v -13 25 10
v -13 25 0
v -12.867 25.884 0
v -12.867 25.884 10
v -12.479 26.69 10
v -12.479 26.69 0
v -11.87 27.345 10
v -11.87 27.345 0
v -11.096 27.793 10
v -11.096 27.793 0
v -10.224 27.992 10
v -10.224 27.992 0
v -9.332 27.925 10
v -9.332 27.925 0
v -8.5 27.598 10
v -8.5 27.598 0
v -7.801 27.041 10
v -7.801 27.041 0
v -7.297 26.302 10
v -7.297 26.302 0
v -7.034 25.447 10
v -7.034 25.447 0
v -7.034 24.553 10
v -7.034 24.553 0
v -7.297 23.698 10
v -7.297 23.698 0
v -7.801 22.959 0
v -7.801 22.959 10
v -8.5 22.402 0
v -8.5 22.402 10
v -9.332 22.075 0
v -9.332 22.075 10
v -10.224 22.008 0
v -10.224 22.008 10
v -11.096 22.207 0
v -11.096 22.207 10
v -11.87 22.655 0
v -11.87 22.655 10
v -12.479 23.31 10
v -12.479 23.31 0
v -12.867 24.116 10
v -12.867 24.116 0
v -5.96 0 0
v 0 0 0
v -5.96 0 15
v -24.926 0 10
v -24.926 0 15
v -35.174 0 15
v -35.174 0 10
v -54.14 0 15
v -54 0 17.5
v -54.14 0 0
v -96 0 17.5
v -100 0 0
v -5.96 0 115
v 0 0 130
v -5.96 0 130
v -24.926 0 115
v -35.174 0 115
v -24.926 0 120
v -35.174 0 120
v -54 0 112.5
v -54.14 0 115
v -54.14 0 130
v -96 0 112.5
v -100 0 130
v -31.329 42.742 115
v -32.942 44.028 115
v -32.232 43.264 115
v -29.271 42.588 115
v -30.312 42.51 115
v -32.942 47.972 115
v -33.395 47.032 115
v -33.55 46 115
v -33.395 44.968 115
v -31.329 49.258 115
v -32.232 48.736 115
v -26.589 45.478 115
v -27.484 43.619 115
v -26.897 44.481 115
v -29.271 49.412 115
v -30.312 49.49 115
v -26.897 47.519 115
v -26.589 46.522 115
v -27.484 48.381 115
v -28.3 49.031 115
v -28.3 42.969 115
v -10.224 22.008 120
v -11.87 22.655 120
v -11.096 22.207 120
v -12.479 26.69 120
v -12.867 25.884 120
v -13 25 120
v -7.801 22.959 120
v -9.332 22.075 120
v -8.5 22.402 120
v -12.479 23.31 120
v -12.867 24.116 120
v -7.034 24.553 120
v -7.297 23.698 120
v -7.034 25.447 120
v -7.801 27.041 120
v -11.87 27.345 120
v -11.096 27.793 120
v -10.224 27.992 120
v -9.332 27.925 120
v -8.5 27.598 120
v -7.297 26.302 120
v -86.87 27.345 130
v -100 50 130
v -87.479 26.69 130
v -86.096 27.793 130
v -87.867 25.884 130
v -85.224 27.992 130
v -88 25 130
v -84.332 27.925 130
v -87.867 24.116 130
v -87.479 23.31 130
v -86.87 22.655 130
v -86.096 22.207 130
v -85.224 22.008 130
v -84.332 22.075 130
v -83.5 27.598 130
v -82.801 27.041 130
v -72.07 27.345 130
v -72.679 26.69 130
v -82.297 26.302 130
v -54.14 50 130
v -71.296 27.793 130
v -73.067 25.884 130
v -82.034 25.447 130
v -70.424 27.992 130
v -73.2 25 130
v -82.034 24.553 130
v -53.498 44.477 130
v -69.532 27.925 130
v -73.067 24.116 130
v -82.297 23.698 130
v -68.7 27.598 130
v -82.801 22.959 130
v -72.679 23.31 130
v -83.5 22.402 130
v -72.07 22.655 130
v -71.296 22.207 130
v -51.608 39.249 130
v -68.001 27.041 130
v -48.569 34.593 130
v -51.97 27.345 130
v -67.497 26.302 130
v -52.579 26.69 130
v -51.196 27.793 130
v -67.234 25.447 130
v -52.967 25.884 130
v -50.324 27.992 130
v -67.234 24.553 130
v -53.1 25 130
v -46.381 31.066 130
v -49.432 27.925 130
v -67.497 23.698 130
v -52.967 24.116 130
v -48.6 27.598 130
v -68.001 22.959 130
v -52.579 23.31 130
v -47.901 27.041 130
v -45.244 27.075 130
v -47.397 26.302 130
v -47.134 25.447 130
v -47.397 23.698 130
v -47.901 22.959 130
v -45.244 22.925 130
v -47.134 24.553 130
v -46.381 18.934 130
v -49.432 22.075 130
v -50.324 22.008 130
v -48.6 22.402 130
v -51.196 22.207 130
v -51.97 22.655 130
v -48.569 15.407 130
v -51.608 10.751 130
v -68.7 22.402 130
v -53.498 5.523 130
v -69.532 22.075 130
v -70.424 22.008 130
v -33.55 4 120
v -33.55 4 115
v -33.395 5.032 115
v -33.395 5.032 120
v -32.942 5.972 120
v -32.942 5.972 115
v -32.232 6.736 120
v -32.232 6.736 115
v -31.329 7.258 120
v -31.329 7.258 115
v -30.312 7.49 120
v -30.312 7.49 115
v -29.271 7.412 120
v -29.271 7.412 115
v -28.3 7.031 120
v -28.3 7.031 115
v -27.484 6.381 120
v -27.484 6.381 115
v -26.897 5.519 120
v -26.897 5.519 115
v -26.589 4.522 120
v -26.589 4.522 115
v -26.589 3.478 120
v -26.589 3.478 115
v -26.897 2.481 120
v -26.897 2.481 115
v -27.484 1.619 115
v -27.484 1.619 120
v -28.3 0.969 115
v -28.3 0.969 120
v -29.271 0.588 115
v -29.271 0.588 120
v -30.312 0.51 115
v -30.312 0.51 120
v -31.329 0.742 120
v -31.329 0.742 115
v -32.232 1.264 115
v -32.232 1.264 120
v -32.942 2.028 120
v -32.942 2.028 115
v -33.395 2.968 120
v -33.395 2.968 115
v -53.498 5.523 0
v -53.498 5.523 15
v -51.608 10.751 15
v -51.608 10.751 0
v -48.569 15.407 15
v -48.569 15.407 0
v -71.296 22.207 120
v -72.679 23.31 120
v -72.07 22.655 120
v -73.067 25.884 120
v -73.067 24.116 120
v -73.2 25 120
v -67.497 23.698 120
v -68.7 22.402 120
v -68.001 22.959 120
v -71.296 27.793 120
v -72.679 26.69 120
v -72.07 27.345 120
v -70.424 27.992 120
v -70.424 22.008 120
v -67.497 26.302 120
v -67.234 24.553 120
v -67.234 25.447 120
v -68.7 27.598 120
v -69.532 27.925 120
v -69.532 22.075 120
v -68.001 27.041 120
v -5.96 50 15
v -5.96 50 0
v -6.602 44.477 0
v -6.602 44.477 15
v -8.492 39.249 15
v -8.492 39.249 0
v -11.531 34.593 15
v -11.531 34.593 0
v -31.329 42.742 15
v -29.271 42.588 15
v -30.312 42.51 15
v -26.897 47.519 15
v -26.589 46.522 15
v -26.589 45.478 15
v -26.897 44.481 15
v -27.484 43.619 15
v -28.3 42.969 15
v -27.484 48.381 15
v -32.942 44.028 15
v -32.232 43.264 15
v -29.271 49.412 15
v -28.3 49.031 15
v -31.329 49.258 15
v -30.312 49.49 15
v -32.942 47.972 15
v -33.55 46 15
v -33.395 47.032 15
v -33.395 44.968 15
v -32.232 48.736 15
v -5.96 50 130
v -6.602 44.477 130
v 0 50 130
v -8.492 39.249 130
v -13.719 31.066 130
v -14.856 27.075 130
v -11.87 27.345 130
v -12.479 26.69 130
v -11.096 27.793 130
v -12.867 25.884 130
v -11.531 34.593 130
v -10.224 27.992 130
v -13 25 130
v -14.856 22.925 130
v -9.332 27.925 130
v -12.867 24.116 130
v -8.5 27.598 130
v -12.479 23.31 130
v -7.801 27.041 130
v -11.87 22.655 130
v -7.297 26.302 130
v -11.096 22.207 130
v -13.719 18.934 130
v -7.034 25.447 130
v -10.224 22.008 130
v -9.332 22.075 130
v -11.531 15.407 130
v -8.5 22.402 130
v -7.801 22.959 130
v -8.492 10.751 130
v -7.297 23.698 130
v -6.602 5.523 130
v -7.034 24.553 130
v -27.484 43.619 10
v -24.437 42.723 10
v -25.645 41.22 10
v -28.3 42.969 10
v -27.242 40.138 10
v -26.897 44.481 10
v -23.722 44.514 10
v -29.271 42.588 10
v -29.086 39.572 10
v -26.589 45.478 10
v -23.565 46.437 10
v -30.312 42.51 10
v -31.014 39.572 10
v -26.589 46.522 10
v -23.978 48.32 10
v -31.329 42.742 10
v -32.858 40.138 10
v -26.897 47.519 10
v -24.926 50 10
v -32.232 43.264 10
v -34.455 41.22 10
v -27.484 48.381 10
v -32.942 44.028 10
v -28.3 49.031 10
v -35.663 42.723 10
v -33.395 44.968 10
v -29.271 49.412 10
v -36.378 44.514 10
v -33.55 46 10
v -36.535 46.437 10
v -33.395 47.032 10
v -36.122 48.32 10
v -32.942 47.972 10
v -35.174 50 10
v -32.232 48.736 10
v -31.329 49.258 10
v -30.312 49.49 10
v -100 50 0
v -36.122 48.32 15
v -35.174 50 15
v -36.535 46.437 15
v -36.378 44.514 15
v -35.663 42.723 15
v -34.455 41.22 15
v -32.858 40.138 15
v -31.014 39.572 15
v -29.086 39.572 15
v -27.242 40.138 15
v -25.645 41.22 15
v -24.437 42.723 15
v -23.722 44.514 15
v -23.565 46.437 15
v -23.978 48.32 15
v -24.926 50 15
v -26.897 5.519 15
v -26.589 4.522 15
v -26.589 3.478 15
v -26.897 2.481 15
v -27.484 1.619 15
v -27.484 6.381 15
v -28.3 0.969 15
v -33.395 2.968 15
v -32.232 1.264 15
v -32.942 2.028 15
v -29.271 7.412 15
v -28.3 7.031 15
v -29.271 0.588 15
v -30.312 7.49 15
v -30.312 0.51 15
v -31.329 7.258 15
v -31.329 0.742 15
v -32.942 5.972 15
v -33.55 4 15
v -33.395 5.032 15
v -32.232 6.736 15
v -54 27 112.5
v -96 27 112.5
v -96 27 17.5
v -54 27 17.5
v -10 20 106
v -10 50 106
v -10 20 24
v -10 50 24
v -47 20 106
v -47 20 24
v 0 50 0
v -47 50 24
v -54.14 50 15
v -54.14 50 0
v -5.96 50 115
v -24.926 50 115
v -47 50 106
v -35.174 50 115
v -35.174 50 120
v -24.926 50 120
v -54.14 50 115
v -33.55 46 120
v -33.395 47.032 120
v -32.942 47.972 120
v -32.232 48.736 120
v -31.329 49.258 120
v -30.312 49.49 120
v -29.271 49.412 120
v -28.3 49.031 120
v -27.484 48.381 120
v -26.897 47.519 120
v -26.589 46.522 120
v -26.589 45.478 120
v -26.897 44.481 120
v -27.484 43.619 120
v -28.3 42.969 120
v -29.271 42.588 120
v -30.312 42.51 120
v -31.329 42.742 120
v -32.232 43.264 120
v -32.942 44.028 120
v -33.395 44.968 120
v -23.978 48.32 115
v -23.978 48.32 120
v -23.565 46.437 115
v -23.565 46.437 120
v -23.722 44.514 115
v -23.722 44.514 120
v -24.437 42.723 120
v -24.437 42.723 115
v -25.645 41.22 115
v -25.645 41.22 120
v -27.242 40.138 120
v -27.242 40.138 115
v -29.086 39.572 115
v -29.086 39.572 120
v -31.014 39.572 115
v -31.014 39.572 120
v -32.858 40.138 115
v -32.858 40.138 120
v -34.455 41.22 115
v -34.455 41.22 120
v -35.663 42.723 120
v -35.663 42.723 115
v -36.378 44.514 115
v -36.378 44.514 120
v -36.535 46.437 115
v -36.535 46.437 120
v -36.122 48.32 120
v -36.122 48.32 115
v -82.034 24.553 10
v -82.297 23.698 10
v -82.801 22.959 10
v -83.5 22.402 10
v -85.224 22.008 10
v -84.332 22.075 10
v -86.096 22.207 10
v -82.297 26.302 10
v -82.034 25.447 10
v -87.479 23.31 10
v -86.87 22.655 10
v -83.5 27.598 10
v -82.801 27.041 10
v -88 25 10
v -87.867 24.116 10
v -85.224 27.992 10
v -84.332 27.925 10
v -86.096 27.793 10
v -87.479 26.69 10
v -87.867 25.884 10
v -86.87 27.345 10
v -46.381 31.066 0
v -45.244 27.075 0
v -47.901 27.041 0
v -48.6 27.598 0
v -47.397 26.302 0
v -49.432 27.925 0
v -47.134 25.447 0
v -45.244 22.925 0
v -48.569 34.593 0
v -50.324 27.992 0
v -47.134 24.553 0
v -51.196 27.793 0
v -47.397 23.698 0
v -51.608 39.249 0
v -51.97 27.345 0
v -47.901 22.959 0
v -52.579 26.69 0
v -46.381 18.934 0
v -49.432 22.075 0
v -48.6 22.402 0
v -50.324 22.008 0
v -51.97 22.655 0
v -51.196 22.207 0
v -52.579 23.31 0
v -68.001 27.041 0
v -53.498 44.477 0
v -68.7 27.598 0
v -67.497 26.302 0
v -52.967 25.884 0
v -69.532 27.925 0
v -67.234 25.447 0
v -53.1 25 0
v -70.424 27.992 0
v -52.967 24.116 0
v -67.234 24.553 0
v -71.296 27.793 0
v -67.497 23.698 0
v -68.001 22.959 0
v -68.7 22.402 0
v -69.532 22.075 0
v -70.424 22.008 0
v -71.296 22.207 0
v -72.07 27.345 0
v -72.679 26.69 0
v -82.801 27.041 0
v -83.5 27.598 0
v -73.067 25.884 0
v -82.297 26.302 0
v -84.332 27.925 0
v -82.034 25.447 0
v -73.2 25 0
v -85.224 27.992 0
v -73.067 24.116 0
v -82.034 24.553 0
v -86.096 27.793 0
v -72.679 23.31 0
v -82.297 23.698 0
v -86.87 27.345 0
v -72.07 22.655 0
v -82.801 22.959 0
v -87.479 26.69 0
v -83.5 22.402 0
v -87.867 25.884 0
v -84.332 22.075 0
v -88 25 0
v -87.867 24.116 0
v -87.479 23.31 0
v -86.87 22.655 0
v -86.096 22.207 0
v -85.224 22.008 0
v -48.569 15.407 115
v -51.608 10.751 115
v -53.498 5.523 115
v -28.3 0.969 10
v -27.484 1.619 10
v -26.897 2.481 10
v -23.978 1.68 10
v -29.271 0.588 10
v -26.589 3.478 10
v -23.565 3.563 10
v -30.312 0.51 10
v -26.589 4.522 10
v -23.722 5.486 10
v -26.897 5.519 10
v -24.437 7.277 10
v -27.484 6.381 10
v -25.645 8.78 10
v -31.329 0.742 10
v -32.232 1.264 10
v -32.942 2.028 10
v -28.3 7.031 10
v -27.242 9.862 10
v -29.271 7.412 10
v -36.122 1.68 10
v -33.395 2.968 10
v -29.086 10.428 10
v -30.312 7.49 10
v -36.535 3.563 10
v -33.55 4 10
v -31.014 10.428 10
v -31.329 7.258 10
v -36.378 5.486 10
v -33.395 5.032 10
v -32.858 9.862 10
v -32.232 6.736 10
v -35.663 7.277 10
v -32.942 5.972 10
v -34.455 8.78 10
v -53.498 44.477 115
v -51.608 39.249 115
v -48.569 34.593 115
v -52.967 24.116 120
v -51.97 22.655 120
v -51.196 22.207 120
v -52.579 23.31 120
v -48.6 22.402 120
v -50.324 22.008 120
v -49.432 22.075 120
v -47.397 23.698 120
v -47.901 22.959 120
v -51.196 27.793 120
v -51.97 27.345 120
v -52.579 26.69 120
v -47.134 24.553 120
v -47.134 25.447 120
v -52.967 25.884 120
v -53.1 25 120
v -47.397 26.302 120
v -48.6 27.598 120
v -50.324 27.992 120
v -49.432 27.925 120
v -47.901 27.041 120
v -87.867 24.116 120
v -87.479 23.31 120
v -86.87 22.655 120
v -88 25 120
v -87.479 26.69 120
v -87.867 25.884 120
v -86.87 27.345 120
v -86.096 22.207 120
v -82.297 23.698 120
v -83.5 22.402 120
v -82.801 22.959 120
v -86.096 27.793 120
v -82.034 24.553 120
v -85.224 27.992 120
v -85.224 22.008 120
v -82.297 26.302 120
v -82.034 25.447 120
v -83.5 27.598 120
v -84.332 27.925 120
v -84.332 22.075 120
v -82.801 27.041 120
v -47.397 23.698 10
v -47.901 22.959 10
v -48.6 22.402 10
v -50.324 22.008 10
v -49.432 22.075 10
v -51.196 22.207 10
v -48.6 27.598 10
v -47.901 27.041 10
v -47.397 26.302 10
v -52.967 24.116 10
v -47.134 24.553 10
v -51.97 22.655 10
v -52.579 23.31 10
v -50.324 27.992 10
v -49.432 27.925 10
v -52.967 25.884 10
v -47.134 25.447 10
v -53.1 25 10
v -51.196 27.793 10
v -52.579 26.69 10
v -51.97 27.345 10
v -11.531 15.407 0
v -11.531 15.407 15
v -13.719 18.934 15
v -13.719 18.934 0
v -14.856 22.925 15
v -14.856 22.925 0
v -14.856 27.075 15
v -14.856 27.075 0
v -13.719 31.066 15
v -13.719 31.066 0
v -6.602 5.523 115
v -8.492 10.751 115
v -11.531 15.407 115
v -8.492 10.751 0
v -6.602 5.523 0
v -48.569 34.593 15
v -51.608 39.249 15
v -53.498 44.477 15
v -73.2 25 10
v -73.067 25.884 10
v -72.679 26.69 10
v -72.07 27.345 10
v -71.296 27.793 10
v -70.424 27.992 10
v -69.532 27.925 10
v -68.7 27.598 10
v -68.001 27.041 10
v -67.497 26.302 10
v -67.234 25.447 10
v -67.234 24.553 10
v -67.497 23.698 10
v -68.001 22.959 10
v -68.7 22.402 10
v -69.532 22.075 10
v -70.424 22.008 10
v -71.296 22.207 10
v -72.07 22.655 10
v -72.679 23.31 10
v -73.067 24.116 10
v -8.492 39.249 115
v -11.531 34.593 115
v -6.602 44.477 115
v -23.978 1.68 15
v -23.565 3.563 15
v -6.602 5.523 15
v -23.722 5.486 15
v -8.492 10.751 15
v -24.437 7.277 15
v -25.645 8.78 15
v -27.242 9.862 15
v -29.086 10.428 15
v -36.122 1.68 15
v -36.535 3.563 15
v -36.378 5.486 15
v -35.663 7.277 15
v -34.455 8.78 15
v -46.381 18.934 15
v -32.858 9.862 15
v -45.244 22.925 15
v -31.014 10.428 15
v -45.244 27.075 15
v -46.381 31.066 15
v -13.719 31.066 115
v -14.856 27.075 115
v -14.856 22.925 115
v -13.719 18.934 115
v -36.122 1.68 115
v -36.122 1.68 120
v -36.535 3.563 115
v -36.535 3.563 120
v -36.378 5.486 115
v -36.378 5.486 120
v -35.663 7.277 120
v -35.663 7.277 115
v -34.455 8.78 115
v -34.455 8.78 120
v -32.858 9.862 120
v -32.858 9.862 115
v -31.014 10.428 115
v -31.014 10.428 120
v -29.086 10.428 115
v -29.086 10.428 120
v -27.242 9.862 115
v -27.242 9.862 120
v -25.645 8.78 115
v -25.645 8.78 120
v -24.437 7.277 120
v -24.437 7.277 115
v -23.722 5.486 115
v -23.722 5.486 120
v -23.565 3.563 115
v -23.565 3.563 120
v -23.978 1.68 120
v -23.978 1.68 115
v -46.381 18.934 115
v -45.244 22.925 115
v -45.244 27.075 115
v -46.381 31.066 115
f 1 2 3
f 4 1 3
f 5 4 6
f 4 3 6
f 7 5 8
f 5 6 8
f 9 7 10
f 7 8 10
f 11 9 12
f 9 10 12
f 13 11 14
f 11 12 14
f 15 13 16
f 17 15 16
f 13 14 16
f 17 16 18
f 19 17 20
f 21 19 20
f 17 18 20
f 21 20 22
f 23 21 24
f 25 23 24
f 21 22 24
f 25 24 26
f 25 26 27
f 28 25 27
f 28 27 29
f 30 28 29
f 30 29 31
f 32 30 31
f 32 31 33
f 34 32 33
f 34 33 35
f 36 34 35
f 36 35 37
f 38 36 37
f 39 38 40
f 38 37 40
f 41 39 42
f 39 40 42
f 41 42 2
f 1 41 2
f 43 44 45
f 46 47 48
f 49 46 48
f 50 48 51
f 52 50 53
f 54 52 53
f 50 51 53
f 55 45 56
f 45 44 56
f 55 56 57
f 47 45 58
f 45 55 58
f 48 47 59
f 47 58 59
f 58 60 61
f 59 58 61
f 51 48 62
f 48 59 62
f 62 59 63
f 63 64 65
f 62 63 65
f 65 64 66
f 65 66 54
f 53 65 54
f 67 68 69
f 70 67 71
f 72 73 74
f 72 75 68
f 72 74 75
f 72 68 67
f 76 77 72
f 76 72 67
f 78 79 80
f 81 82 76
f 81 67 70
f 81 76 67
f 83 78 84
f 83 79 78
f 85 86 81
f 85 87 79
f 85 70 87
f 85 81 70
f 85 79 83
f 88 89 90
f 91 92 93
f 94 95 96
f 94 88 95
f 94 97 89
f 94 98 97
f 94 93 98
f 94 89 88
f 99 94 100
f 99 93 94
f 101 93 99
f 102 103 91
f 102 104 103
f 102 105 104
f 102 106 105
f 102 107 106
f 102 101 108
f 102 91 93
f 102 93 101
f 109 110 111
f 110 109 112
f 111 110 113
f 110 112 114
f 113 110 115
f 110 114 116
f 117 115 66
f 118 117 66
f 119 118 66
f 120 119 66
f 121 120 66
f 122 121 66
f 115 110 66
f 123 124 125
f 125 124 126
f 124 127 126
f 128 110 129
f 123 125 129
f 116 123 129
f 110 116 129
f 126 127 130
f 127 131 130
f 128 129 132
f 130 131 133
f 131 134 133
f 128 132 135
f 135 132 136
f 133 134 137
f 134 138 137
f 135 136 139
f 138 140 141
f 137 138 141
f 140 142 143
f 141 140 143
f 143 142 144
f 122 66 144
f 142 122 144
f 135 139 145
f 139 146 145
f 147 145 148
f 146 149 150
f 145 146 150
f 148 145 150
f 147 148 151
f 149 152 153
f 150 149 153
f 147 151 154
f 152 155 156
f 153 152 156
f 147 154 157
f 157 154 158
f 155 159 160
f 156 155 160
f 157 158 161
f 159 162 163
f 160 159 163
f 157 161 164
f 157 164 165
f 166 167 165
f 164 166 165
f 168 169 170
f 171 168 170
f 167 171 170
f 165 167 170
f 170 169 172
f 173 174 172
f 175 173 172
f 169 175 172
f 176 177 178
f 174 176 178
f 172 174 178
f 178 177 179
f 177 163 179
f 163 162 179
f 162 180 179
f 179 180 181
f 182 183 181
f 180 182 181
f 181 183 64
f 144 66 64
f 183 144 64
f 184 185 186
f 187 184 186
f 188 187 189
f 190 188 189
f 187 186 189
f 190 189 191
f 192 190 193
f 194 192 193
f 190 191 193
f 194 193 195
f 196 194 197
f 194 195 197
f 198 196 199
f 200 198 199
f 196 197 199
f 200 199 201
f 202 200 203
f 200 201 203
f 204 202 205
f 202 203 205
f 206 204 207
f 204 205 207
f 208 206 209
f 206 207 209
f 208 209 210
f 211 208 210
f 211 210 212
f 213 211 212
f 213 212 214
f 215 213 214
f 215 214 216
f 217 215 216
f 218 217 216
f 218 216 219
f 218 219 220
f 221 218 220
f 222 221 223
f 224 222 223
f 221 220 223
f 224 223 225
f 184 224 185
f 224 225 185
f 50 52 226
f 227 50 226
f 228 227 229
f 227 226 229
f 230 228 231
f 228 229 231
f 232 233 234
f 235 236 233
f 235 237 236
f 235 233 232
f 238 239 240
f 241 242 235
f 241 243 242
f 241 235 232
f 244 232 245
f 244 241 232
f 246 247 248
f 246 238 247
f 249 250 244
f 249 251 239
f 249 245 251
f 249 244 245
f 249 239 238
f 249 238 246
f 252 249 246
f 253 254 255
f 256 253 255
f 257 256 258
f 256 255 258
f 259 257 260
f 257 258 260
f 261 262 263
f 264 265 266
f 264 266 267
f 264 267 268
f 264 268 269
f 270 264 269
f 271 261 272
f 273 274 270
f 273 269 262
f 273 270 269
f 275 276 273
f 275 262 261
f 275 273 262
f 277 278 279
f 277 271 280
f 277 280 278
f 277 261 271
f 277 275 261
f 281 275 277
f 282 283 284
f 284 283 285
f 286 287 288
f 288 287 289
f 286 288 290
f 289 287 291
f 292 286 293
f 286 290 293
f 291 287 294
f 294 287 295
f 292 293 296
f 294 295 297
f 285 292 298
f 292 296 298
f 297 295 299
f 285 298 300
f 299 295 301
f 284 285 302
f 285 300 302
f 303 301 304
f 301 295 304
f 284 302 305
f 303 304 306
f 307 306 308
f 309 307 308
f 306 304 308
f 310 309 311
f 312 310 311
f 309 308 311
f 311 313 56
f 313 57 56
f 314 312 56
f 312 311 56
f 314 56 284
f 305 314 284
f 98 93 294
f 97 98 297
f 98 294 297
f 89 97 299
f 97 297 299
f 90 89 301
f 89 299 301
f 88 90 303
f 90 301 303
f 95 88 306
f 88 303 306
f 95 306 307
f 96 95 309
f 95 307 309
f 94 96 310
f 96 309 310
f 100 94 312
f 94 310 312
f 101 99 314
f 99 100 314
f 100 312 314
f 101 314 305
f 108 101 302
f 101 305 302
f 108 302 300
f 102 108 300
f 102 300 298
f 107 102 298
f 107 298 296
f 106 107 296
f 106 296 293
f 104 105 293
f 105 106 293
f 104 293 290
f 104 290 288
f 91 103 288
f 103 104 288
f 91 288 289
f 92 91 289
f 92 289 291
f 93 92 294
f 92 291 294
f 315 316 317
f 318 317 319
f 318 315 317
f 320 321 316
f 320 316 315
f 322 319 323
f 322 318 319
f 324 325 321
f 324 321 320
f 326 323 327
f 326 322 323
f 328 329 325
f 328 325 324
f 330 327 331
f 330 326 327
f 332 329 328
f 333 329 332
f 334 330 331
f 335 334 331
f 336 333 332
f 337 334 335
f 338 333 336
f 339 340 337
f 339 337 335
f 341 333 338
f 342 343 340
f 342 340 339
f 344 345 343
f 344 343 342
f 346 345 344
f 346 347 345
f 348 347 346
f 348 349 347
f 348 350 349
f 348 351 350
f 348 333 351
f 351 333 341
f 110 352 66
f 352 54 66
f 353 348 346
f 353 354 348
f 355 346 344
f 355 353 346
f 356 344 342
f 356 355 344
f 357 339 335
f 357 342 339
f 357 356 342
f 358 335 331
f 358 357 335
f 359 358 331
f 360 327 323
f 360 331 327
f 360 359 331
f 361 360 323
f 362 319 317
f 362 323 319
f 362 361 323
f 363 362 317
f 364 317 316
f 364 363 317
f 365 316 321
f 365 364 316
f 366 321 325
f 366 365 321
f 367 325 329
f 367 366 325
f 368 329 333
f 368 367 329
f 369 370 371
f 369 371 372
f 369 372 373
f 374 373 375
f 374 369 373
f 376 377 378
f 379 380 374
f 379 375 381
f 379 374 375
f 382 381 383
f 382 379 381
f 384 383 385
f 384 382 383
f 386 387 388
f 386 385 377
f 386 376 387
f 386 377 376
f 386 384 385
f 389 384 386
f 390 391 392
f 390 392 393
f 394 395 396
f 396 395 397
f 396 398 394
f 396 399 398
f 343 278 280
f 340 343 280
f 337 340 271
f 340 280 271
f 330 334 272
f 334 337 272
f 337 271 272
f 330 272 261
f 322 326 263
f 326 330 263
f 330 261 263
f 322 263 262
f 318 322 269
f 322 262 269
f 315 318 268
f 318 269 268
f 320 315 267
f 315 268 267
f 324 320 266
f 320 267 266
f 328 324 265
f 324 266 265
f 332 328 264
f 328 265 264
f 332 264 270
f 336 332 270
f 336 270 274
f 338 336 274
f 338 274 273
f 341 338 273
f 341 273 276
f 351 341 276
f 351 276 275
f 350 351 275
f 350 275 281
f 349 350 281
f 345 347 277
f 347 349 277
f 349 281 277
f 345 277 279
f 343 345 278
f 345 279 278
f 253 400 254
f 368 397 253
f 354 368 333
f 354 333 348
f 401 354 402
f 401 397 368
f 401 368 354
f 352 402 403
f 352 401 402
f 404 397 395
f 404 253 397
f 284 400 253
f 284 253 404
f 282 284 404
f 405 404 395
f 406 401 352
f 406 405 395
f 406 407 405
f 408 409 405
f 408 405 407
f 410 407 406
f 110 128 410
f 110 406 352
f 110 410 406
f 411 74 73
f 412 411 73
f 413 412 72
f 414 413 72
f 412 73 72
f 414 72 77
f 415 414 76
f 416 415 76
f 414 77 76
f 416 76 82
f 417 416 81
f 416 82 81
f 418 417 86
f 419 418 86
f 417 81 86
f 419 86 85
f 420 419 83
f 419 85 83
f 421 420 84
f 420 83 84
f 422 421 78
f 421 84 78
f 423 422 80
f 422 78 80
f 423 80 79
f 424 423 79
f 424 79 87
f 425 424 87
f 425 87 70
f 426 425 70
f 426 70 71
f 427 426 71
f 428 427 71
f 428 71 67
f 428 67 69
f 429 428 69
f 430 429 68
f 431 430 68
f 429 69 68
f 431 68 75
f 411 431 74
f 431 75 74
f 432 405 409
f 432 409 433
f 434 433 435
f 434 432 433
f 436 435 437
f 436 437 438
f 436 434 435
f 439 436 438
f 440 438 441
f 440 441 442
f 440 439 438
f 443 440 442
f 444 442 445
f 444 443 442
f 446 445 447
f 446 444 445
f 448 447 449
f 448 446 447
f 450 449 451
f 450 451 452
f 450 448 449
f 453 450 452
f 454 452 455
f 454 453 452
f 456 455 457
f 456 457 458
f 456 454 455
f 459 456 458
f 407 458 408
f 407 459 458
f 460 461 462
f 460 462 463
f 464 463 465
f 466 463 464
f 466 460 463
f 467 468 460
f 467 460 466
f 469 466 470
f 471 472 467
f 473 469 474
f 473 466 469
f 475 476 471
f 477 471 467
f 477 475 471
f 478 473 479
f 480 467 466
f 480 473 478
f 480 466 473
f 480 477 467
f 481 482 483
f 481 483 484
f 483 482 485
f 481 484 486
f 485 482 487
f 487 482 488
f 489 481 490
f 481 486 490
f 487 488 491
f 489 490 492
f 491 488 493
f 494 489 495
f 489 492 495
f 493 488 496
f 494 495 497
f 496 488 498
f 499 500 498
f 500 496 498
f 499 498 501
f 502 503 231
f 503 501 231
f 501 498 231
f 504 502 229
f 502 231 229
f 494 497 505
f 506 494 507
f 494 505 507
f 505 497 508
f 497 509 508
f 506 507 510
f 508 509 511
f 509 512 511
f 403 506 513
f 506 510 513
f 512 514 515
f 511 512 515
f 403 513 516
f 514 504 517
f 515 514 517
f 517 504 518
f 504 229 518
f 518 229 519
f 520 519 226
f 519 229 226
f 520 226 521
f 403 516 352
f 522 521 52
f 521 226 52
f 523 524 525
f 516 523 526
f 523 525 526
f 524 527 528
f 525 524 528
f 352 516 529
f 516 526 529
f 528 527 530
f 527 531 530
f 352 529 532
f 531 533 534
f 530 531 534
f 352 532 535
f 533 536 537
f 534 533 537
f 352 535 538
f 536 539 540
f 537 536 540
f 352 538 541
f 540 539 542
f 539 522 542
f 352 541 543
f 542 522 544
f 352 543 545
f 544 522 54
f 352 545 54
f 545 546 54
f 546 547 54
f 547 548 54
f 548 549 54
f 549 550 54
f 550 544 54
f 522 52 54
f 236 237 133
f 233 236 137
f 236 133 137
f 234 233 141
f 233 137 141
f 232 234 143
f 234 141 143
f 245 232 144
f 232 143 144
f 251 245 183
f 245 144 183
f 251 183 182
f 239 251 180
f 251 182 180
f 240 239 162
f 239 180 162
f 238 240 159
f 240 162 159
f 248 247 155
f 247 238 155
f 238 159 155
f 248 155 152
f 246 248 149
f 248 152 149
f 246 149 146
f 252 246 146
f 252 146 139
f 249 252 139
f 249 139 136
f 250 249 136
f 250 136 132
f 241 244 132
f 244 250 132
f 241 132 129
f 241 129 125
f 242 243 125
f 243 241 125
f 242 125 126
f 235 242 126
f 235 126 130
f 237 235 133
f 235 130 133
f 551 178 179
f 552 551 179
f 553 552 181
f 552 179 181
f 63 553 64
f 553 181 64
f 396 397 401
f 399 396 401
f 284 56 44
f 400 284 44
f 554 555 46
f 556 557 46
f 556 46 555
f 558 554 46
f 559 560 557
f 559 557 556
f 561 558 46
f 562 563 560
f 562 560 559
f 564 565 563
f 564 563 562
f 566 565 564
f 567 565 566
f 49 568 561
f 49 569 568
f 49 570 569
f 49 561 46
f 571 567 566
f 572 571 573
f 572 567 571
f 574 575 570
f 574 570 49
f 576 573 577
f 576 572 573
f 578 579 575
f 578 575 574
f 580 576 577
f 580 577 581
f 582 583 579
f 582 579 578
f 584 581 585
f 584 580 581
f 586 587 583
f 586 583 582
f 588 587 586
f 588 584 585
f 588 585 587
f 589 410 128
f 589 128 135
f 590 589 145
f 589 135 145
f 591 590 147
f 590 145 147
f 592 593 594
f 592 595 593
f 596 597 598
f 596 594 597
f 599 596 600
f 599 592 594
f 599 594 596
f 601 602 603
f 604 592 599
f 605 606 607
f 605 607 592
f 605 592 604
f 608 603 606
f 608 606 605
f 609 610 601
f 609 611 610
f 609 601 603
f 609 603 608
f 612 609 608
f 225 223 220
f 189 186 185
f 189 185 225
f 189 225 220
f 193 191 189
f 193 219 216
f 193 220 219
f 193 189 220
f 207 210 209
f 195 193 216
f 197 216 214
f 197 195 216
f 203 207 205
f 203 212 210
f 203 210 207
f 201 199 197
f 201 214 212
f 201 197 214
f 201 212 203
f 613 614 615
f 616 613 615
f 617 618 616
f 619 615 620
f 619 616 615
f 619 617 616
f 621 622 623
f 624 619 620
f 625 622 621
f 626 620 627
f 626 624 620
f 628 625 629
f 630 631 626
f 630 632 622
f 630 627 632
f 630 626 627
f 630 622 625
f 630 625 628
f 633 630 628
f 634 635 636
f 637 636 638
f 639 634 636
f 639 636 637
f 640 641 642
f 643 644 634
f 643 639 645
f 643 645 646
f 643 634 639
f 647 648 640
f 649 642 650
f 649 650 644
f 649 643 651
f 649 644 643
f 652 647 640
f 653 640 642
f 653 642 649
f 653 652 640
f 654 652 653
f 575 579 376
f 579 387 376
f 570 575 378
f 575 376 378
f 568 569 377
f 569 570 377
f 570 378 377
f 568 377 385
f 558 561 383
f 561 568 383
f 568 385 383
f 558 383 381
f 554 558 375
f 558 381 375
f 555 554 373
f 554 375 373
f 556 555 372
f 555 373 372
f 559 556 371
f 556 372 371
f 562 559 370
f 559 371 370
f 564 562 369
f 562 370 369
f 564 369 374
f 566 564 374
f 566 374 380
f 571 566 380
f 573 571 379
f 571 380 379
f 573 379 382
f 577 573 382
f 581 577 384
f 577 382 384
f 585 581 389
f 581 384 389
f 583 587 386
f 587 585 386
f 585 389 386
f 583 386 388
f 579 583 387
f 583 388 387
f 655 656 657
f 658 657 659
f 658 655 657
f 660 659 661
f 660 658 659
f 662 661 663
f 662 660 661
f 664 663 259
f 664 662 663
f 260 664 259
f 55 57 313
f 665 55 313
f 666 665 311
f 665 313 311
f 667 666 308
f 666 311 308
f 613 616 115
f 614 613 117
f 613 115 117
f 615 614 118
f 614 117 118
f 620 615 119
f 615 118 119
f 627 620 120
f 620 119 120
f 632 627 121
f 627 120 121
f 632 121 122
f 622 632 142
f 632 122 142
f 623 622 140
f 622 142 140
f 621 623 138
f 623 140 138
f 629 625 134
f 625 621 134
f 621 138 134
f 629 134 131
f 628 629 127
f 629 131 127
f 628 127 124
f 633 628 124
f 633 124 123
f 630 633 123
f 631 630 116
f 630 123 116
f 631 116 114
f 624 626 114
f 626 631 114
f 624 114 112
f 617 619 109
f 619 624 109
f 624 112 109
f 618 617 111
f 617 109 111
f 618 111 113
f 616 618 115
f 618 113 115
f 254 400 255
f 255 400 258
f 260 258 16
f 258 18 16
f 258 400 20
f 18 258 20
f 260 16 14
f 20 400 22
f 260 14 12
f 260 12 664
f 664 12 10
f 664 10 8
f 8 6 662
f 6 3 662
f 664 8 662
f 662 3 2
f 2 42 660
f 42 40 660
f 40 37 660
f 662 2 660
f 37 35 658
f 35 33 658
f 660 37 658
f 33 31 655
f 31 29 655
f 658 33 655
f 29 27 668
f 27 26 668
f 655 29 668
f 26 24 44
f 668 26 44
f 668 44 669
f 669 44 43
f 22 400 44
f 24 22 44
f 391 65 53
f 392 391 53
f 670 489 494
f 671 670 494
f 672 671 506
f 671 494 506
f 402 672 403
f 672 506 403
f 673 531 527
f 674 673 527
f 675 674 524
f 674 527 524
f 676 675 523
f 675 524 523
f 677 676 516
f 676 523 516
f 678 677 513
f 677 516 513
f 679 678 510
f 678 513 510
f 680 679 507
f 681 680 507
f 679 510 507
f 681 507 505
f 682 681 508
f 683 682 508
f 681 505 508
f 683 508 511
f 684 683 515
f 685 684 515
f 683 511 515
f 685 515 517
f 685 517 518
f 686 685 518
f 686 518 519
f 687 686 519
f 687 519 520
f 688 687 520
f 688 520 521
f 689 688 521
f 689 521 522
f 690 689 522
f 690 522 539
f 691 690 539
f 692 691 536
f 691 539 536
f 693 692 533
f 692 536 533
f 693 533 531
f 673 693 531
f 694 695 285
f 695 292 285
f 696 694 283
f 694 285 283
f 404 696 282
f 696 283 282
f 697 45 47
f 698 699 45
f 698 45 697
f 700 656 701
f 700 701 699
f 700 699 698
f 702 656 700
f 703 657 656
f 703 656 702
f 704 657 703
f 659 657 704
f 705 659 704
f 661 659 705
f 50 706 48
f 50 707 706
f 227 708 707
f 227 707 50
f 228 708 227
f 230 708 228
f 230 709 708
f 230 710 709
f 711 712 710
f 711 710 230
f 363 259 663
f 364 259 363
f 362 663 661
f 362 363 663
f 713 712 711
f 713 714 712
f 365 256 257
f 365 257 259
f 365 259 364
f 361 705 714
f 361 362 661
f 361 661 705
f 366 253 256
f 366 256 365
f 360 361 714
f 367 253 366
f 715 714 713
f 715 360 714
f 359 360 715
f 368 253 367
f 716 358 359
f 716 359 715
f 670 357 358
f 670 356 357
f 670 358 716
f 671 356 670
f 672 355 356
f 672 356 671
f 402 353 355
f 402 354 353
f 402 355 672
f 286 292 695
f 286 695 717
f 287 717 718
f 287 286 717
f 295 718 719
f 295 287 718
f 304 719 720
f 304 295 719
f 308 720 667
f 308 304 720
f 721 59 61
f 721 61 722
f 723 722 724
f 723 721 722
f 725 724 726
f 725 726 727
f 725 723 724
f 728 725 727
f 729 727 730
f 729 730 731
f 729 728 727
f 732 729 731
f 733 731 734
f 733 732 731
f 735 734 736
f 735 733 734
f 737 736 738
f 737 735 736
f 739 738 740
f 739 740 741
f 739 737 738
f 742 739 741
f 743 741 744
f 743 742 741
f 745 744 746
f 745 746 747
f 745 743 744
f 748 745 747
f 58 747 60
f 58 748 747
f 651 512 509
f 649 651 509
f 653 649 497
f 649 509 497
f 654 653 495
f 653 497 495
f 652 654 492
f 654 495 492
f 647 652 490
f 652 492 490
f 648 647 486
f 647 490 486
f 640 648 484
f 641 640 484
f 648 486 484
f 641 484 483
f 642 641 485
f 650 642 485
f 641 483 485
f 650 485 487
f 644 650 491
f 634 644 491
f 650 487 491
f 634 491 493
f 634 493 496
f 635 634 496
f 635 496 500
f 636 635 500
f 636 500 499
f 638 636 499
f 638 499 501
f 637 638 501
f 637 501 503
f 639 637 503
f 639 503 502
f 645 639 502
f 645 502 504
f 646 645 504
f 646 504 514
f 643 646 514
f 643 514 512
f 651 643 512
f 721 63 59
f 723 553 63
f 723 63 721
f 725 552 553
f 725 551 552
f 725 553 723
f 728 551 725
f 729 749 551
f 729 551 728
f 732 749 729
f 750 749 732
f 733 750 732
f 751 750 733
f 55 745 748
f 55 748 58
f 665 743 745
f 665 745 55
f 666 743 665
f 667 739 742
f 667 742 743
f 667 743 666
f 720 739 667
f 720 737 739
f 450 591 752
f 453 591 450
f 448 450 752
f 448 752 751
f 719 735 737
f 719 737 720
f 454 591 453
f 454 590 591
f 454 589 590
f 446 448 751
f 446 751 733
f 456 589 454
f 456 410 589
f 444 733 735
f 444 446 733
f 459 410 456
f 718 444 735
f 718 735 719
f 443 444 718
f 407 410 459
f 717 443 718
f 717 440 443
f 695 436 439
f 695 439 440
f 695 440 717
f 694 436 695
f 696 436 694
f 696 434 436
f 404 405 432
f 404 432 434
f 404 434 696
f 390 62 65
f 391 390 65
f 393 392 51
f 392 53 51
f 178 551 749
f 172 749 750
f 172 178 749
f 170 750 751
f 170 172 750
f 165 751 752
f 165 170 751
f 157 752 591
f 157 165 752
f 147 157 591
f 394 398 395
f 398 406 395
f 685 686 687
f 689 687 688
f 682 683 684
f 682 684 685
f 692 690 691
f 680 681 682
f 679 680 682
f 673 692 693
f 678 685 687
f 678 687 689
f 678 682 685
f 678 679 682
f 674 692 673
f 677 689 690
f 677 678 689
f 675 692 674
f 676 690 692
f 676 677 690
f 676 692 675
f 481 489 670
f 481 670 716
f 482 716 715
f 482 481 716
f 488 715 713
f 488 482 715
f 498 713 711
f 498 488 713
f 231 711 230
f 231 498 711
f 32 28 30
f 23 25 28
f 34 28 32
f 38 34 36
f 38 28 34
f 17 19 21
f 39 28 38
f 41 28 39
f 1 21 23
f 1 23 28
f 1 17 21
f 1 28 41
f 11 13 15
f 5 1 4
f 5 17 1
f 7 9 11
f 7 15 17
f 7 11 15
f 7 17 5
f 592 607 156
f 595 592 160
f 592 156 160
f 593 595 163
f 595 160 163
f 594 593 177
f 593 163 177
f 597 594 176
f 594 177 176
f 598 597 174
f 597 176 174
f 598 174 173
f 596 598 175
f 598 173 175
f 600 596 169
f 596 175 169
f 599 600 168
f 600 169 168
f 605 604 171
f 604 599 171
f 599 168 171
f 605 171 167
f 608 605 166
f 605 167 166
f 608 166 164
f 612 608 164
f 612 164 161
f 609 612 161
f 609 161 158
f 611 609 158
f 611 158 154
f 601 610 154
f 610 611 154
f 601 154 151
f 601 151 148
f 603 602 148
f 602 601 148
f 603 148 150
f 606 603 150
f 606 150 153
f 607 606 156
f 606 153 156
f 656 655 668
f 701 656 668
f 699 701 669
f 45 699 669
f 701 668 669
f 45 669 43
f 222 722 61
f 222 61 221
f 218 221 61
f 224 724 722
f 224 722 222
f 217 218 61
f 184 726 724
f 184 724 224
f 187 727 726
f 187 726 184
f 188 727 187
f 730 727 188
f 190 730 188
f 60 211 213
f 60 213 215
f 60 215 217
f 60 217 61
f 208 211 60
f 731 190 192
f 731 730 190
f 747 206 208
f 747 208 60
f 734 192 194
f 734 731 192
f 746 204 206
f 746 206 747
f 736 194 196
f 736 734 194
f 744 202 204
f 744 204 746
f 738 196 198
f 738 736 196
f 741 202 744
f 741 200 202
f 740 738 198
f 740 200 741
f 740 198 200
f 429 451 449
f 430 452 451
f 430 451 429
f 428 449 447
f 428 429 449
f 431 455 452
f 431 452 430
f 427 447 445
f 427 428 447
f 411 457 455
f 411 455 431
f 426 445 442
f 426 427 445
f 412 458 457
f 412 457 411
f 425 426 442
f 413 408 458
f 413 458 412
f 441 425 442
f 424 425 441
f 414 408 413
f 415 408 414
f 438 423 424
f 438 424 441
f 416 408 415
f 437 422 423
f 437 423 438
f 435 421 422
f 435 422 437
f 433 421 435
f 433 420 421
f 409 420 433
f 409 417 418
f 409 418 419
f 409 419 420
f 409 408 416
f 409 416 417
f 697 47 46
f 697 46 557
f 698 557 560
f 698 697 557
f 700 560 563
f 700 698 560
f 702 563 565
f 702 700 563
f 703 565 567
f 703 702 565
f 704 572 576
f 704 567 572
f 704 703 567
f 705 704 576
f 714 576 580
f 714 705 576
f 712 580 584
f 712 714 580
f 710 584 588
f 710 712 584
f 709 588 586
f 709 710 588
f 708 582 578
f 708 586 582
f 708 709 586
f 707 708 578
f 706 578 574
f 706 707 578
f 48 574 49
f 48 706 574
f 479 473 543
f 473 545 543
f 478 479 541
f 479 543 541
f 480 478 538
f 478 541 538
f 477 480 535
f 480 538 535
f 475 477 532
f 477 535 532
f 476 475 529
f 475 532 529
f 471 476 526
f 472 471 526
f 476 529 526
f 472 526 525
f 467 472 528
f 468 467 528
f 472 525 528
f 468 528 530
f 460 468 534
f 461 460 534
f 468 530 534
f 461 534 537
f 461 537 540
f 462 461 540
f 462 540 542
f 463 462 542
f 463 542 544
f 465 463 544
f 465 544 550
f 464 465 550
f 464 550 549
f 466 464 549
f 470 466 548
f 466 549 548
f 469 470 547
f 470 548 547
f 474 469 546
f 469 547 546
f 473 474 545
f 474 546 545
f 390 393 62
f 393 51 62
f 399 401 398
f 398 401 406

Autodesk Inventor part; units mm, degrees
ref_plane "YZ Plane" through (0, 0, 0) normal (1, 0, 0) x (0, 1, 0)
sketch "Sketch1" plane through (0, 0, 0) normal (0, 1, 0) x (-1, 0, 0)
  line L0 (0, 0) -> (100, 0)
  line L1 (100, 0) -> (100, 130)
  line L2 (100, 130) -> (0, 130)
  line L3 (0, 130) -> (0, 0)
  dimension "d0" = 130
  dimension "d1" = 100
extrude "Extrusion1" add sketch "Sketch1" along normal blind 50
sketch "Sketch2" plane through (0, 50, 0) normal (0, 1, 0) x (1, 0, 0)
  line L0 (-47, -106) -> (-10, -106)
  line L1 (-10, -106) -> (-10, -24)
  line L2 (-10, -24) -> (-47, -24)
  line L3 (-47, -24) -> (-47, -106)
  line L4 (0, -130) -> (0, 0) projected
  line L5 (-100, 0) -> (-100, -130) projected
  line L6 (-100, -130) -> (0, -130) projected
  line L7 (0, -130) -> (0, 0) projected
  line L8 (0, 0) -> (-100, 0) projected
  line L9 (-100, -65) -> (0, -65) construction
  point P0 (-47, -65)
  dimension "d4" = 82
  dimension "d5" = 37
  dimension "d6" = 10
extrude "Extrusion2" cut sketch "Sketch2" against normal blind 30 contours L3 L2 L1 L0
sketch "Sketch3" plane through (0, 0, 0) normal (0, -1, 0) x (1, 0, 0)
  line L0 (-96, 17.5) -> (-54, 17.5)
  line L1 (-54, 17.5) -> (-54, 112.5)
  line L2 (-54, 112.5) -> (-96, 112.5)
  line L3 (-96, 112.5) -> (-96, 17.5)
  line L4 (-100, 0) -> (-100, 130) projected
  line L5 (0, 0) -> (-100, 0) projected
  line L6 (0, 130) -> (0, 0) projected
  line L7 (-100, 130) -> (0, 130) projected
  line L8 (0, 65) -> (-100, 65) construction
  point P0 (-54, 65)
  dimension "d9" = 42
  dimension "d10" = 95
  dimension "d11" = 4
extrude "Extrusion3" cut sketch "Sketch3" against normal blind 27 contours L3 L2 L1 L0
ref_plane "Work Plane1" through (0, 25, 0) normal (0, 1, 0) x (1, 0, 0)
ref_plane "Work Plane2" through (0, 0, 65) normal (0, 0, -1) x (-1, 0, 0)
sketch "Sketch5" plane through (0, 0, 0) normal (0, 0, -1) x (-1, 0, 0)
  line L0 (0, 0) -> (100, 0) projected
  line L1 (100, 0) -> (100, 50) projected
  line L2 (0, 50) -> (100, 50) projected
  line L3 (0, 0) -> (0, 50) projected
  line L4 (-20, 25) -> (120, 25) projected
  arc A0 (0, 10) -> (0, 40) centre (0, 25) ccw
  arc A1 (48.5688, 34.5933) -> (11.5312, 34.5933) centre (30.05, 50) ccw
  arc A2 (11.5312, 15.4067) -> (48.5688, 15.4067) centre (30.05, 0) ccw
  circle A3 centre (60.1, 25) radius 15
  point P0 (54.1397, 50)
  point P1 (5.9603, 50)
  point P2 (5.9603, 0)
  point P3 (54.1397, 0)
  dimension "d14" = 30
  dimension "d15" = 60.1
extrude "Extrusion4" cut sketch "Sketch5" against normal blind 15 contours A2 A0 L4 A3 L0 | A0 A1 L2 A3 L4
mirror "Mirror1" about plane through (0, 0, 65) normal (0, 0, -1) of "Extrusion4"
sketch "Sketch6" plane through (0, 0, 15) normal (0, 0, -1) x (-1, 0, 0)
  arc A0 (48.5688, 34.5933) -> (54.1397, 50) centre (30.05, 50) ccw projected
  line L0 (5.9603, 50) -> (54.1397, 50) projected
  arc A1 (5.9603, 50) -> (11.5312, 34.5933) centre (30.05, 50) ccw projected
  arc A2 (11.5312, 15.4067) -> (11.5312, 34.5933) centre (0, 25) ccw projected
  arc A3 (11.5312, 15.4067) -> (5.9603, 0) centre (30.05, 0) ccw projected
  line L1 (54.1397, 0) -> (5.9603, 0) projected
  arc A4 (54.1397, 0) -> (48.5688, 15.4067) centre (30.05, 0) ccw projected
  arc A5 (48.5688, 34.5933) -> (48.5688, 15.4067) centre (60.1, 25) ccw projected
  arc A6 (24.9265, 50) -> (35.1735, 50) centre (30.05, 46) ccw
  arc A7 (35.1735, 0) -> (24.9265, 0) centre (30.05, 4) ccw
  line L2 (30.05, 50) -> (30.05, 0) construction
  line L3 (-20, 25) -> (120, 25) projected
  circle A8 centre (30.05, 4) radius 3.5
  circle A9 centre (30.05, 46) radius 3.5
  point P0 (0, 0)
  dimension "d18" = 13
  dimension "d19" = 42
  dimension "d20" = 21
  dimension "d21" = 7
extrude "Extrusion5" add sketch "Sketch6" along normal blind 5 contours A6 L0 | L1 A7
mirror "Mirror2" about plane through (0, 0, 65) normal (0, 0, -1) of "Extrusion5"
sketch "Sketch7" plane through (-100, 0, 0) normal (0, 0, -1) x (-1, 0, 0)
  circle A0 centre (-90, 25) radius 3
  circle A1 centre (-49.9, 25) radius 3
  arc A2 (-88.4688, 15.4067) -> (-94.0397, 0) centre (-69.95, 0) ccw projected
  arc A3 (-88.4688, 15.4067) -> (-88.4688, 34.5933) centre (-100, 25) ccw projected
  arc A4 (-94.0397, 50) -> (-88.4688, 34.5933) centre (-69.95, 50) ccw projected
  line L0 (-100, 50) -> (-94.0397, 50) projected
  line L1 (-100, 0) -> (-100, 50) projected
  line L2 (-100, 0) -> (-94.0397, 0) projected
  arc A5 (-45.8603, 0) -> (-51.4312, 15.4067) centre (-69.95, 0) ccw projected
  line L3 (-45.8603, 0) -> (0, 0) projected
  line L4 (0, 0) -> (0, 50) projected
  line L5 (-45.8603, 50) -> (0, 50) projected
  arc A6 (-51.4312, 34.5933) -> (-45.8603, 50) centre (-69.95, 50) ccw projected
  arc A7 (-51.4312, 34.5933) -> (-51.4312, 15.4067) centre (-39.9, 25) ccw projected
  line L6 (-120, 25) -> (20, 25) projected
  line L7 (-69.95, 0) -> (-69.95, 50) construction
  circle A8 centre (-29.8, 25) radius 3
  circle A9 centre (-15, 25) radius 3
  dimension "d24" = 6
  dimension "d25" = 6
  dimension "d26" = 40.1
  dimension "d27" = 20.05
  dimension "d30" = 20.1
  dimension "d31" = 14.8
extrude "Extrusion6" cut sketch "Sketch7" against normal blind 10 contours L6 A0 | A0 L6 | L6 A1 | A1 L6 | A8 L6 | L6 A8 | A9 L6 | L6 A9
mirror "Mirror3" about plane through (0, 0, 65) normal (0, 0, -1) of "Extrusion6"
equation "\"d20\" = 0.5 * d19"
equation "\"d27\" = 0.5 * d26"
properties part number "Full_Body"
